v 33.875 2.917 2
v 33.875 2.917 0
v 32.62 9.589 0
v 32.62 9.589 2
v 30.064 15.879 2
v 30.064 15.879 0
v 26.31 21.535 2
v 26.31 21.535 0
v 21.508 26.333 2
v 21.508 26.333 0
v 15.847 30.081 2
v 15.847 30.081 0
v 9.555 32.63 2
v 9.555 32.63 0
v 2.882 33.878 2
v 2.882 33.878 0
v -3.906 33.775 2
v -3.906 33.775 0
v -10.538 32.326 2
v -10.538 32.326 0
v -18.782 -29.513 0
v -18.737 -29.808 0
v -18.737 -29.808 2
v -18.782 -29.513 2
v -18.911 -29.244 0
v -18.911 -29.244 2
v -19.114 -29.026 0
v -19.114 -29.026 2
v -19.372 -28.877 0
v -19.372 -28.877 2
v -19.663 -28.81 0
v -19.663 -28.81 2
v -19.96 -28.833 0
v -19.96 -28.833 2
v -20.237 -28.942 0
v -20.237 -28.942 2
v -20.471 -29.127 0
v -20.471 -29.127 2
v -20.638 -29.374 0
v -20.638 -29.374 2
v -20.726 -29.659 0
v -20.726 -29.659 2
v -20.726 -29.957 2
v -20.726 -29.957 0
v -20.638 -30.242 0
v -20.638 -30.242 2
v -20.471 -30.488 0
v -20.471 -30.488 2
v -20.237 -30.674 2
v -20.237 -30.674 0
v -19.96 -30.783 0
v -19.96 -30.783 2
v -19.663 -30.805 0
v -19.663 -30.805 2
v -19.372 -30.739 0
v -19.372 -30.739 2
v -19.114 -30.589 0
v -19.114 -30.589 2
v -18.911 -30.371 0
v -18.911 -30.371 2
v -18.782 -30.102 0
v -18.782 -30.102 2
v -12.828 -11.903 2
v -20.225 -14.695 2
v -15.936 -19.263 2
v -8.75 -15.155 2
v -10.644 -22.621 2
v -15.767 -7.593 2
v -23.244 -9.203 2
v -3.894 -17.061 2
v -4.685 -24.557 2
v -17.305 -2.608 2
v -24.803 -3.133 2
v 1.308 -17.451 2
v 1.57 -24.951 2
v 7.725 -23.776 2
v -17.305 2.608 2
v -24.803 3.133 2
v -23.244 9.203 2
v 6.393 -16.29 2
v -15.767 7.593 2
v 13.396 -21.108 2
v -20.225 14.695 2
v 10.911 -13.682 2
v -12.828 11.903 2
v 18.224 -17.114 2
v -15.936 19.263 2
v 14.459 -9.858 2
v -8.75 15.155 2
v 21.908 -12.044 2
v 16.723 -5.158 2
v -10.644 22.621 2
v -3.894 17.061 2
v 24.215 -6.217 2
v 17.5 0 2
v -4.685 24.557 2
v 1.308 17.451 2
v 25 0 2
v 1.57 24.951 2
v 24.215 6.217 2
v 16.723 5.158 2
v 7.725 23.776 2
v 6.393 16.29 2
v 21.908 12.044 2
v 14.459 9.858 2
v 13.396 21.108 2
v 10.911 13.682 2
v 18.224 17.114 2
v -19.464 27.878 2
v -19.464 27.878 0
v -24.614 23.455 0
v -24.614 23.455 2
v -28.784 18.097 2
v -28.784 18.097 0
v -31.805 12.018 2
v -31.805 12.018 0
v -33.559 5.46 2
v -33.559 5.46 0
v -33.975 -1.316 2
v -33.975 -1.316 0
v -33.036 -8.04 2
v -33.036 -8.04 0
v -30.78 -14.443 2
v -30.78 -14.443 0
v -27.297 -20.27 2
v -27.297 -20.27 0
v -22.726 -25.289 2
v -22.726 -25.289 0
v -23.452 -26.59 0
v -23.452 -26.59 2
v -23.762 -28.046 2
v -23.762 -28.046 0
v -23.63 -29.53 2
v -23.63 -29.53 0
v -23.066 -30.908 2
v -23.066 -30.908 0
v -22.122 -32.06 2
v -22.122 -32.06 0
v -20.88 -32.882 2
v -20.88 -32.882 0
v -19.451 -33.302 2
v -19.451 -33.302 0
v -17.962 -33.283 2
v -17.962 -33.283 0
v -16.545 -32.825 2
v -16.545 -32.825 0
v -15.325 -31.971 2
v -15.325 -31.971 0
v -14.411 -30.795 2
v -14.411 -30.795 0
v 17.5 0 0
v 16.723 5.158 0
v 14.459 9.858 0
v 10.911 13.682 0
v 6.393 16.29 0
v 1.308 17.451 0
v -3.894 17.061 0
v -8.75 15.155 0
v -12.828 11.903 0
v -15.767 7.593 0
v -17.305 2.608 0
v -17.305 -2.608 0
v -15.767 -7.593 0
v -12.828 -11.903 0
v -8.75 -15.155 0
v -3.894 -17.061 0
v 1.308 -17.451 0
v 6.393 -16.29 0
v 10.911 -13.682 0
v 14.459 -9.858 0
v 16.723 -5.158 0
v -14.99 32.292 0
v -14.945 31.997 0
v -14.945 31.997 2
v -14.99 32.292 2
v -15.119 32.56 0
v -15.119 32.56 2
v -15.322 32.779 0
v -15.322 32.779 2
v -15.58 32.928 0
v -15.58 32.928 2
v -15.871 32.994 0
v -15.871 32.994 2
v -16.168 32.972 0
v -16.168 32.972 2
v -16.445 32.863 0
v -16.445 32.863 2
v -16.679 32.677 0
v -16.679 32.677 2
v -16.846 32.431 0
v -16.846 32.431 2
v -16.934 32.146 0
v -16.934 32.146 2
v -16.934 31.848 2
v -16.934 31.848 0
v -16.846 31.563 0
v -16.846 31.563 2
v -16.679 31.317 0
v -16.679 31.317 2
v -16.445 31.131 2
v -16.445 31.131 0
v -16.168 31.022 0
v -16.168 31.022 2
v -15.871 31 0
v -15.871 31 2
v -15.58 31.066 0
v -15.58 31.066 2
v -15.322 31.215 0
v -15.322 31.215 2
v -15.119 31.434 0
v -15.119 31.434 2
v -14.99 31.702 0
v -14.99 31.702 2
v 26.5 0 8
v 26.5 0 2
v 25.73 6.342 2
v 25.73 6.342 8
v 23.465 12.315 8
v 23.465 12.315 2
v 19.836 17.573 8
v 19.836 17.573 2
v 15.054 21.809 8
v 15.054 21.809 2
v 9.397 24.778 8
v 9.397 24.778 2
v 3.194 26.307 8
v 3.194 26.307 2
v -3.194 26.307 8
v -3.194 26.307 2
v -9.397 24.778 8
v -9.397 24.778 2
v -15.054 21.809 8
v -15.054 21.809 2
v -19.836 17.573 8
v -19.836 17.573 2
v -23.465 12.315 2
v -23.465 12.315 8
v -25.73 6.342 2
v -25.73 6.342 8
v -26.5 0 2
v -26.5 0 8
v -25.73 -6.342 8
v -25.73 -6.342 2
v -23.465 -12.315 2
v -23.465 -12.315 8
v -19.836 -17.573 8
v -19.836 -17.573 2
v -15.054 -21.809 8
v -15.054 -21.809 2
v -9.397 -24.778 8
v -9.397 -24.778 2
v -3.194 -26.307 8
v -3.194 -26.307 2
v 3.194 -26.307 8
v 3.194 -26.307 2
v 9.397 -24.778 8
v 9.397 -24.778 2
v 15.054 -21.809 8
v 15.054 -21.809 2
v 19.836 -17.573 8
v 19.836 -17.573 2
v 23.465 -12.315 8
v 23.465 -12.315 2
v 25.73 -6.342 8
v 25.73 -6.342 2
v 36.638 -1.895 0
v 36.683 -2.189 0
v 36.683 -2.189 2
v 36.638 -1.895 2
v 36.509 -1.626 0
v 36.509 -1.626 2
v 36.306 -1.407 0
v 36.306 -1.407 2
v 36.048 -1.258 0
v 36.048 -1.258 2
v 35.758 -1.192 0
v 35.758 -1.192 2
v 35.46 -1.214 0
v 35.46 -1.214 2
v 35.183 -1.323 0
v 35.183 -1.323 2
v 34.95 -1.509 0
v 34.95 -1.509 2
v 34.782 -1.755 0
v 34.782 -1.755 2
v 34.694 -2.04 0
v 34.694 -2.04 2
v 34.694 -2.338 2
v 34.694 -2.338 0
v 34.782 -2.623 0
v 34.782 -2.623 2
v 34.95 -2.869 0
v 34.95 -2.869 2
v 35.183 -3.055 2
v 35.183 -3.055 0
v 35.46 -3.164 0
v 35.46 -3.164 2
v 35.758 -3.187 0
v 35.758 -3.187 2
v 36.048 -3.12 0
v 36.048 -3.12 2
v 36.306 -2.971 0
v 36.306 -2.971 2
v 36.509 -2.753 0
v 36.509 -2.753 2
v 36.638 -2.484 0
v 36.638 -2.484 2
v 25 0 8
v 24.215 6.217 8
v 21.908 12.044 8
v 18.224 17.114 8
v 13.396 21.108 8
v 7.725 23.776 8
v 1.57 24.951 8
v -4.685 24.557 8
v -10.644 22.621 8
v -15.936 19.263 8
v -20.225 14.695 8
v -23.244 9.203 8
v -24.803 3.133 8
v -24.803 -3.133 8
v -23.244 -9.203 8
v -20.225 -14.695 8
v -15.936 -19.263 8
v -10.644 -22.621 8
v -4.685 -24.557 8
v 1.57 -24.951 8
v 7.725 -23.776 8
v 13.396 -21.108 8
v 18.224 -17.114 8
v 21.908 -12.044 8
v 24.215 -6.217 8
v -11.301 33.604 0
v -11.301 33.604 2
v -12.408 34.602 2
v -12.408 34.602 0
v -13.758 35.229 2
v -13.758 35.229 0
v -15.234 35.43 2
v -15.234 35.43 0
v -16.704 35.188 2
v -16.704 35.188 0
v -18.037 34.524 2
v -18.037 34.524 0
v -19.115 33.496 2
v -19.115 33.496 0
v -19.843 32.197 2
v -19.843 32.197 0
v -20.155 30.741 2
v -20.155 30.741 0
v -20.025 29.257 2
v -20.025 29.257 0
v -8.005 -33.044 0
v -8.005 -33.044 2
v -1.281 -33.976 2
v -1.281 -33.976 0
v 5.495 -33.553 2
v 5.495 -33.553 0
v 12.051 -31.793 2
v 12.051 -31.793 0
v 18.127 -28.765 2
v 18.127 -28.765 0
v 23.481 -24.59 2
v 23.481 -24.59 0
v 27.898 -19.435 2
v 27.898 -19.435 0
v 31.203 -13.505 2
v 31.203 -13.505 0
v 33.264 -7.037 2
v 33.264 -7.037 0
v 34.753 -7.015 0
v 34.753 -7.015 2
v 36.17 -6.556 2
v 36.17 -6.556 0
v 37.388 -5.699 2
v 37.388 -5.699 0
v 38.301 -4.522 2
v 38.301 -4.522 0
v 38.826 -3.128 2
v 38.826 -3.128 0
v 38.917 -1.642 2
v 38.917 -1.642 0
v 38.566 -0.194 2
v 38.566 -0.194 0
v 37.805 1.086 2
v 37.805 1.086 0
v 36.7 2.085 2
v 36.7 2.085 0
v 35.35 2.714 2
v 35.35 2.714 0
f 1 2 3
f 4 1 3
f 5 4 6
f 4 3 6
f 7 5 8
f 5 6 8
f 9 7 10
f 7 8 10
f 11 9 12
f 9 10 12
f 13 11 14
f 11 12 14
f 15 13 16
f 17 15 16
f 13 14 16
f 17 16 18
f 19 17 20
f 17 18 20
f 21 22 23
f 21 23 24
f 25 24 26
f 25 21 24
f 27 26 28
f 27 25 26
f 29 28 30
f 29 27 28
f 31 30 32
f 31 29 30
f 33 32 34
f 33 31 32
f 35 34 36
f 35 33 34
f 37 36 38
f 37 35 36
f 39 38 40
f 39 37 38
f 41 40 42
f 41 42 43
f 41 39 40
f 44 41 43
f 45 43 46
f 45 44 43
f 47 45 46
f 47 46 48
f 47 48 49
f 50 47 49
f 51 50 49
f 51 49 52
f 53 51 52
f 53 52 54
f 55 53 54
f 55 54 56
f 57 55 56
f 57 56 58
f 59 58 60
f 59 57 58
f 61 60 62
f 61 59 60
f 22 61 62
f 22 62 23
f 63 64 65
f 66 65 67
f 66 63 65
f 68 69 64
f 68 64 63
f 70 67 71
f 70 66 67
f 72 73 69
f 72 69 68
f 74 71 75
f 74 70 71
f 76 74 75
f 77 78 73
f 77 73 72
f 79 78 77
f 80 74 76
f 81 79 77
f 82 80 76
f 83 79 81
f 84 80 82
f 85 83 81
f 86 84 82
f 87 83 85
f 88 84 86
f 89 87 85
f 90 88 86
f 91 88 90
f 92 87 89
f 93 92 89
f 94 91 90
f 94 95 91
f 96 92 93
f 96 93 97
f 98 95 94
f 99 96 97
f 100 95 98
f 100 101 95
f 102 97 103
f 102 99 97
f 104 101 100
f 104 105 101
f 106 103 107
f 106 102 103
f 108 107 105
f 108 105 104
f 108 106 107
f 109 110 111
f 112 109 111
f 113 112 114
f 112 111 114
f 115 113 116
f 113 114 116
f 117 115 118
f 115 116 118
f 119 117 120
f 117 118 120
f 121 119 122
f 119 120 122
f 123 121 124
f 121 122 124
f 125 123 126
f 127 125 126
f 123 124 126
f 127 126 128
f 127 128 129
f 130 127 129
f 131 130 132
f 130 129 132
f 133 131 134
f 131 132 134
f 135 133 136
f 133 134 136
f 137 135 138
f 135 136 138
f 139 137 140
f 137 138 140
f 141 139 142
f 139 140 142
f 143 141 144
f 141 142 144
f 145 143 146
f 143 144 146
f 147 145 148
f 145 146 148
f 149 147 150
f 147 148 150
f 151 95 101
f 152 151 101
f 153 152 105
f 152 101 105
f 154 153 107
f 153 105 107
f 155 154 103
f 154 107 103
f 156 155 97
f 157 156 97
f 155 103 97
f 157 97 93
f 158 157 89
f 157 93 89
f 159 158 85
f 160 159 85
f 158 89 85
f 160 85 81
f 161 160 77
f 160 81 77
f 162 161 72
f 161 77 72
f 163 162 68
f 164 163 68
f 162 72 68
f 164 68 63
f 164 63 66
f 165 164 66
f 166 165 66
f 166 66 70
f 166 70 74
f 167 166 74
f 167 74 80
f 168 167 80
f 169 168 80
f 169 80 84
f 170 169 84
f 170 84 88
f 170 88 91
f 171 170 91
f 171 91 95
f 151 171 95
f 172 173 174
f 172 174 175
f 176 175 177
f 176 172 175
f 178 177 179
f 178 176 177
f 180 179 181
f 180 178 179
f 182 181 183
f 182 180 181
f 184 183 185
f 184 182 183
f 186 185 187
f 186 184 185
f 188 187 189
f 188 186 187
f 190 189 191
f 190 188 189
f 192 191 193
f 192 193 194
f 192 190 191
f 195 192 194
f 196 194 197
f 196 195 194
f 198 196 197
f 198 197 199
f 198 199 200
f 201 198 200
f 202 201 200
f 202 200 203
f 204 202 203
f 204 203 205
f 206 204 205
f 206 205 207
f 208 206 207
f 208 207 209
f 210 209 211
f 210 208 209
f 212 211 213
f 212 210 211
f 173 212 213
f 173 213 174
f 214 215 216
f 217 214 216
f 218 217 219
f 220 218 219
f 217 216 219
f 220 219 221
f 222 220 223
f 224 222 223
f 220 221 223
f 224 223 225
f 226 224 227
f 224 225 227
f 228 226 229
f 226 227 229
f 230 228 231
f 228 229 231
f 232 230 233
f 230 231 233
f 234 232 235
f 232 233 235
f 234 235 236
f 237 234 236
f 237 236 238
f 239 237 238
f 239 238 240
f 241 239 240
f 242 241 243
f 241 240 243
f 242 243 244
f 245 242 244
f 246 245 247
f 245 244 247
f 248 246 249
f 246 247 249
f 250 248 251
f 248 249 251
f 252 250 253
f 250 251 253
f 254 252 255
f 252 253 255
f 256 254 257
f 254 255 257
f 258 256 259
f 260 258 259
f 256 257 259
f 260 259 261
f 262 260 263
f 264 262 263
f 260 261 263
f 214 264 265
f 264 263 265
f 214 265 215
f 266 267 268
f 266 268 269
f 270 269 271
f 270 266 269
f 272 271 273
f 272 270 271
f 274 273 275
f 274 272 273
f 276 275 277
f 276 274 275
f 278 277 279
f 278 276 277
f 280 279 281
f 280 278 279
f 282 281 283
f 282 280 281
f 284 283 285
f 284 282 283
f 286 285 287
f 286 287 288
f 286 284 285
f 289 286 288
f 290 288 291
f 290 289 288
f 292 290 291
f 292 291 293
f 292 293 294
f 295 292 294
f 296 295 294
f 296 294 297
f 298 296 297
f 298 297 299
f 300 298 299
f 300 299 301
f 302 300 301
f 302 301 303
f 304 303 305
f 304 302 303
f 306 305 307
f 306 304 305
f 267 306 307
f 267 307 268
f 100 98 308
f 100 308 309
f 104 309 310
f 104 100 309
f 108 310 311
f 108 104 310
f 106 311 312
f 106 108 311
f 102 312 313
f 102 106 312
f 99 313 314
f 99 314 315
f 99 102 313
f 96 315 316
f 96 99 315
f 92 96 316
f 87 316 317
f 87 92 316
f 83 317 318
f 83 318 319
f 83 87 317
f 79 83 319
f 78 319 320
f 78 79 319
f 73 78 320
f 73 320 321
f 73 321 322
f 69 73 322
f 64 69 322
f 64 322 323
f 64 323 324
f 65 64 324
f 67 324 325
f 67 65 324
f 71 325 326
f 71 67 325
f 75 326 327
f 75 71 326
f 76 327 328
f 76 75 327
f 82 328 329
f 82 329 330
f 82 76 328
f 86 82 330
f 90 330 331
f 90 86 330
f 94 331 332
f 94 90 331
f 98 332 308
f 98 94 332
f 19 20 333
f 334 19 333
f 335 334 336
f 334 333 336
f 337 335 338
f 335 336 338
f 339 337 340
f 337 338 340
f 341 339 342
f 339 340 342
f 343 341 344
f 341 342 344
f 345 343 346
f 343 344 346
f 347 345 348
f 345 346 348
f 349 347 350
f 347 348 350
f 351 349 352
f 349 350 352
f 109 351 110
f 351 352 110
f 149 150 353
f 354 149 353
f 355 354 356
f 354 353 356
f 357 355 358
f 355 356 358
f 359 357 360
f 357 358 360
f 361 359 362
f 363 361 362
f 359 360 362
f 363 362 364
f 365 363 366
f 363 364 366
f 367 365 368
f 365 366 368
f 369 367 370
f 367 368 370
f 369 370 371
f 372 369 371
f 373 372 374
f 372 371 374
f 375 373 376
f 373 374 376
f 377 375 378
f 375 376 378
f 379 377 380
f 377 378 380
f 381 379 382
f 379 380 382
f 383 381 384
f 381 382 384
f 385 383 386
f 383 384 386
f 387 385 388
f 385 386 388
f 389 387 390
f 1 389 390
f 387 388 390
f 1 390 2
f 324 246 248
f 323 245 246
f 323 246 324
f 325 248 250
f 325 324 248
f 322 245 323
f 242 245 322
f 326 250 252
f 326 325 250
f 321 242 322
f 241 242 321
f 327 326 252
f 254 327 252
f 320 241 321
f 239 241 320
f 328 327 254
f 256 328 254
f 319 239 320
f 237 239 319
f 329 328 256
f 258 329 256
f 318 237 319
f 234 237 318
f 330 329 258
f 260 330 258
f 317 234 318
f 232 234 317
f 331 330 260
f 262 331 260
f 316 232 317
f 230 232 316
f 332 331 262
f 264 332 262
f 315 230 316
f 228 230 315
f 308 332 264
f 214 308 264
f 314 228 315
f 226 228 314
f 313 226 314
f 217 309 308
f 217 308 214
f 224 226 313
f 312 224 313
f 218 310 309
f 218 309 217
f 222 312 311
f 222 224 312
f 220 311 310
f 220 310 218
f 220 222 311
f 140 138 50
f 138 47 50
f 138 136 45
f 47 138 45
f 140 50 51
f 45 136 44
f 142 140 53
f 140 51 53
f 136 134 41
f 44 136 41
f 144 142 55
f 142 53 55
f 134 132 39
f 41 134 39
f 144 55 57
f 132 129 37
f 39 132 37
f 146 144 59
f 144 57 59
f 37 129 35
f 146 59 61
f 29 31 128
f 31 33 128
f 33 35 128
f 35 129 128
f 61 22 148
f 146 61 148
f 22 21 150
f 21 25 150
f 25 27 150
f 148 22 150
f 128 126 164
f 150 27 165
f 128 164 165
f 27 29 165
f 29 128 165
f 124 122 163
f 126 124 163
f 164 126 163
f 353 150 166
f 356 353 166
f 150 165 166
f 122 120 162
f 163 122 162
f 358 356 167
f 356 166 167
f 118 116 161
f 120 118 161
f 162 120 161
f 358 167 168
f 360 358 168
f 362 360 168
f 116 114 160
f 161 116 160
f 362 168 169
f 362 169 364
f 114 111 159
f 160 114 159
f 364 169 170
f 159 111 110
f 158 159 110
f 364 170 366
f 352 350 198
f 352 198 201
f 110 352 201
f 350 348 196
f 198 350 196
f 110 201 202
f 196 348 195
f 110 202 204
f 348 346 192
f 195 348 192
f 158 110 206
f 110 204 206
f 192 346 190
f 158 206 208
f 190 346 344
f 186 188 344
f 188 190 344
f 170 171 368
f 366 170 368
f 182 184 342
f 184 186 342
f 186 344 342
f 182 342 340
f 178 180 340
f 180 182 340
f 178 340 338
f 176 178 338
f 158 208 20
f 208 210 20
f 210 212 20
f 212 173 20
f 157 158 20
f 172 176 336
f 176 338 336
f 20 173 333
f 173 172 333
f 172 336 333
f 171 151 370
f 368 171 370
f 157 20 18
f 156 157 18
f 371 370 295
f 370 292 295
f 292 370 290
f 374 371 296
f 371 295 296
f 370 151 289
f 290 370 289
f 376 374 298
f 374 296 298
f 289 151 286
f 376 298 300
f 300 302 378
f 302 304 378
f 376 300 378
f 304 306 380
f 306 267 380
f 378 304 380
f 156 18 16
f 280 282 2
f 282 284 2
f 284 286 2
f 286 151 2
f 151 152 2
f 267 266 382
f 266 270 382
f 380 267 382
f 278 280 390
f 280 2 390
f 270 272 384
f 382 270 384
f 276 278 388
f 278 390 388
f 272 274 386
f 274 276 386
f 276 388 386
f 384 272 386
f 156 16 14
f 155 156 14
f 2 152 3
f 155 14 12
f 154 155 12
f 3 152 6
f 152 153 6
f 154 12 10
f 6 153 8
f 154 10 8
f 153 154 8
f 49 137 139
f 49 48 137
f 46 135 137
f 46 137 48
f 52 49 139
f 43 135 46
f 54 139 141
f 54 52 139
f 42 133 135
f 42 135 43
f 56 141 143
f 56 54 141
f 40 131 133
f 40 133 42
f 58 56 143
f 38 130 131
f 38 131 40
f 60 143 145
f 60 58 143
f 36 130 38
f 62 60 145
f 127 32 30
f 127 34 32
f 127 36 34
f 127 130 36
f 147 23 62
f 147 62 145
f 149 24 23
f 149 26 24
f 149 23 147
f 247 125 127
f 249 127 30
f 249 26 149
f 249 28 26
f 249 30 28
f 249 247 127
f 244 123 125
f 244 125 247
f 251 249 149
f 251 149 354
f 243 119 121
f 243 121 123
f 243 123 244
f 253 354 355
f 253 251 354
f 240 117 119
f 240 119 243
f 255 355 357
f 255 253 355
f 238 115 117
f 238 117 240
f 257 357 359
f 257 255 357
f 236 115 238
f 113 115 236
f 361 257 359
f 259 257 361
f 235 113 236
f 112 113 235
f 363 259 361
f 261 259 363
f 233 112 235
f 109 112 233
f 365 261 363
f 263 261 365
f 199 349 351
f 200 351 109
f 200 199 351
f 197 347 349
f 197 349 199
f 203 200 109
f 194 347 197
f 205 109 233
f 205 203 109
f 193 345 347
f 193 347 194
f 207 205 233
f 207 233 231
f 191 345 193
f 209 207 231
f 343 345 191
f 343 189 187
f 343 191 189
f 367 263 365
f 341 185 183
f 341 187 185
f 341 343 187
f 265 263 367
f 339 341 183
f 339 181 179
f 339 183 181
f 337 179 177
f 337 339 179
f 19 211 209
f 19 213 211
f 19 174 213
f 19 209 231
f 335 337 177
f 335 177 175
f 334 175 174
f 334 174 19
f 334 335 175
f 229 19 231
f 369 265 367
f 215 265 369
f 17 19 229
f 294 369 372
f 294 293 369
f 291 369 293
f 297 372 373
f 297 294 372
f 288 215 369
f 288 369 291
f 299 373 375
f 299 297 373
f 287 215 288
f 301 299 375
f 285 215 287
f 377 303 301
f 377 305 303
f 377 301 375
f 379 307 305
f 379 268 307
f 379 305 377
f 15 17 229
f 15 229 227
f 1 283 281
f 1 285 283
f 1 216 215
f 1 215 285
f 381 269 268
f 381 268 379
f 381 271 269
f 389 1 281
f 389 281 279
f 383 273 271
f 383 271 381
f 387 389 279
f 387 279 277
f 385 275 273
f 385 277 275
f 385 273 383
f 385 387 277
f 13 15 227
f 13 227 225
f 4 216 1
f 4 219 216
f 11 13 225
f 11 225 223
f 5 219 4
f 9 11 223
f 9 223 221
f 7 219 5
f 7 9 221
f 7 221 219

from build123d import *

# Parameters (mm, degrees)
SKETCH1_R           = 1
BOSS_EXTRUDE1_DEPTH = 2
SKETCH2_R           = 26.5
SKETCH2_R_2         = 25
BOSS_EXTRUDE2_DEPTH = 6
SKETCH3_R           = 17.5
CUT_EXTRUDE1_DEPTH  = 6


with BuildPart() as part:
    # Sketch1 → Boss-Extrude1 (new body)
    with BuildSketch(Plane.XY):
        with BuildLine():
            ThreePointArc((-19.463908256, 27.877522763), (-33.936185412, 2.082143047), (-22.725920861, -25.288980229))
            ThreePointArc((-22.725920861, -25.288980229), (-21.53176405, -32.517428202), (-14.410688779, -30.795000388))
            ThreePointArc((-14.410688779, -30.795000388), (15.164903933, -30.430670198), (33.263859745, -7.036734675))
            ThreePointArc((33.263859745, -7.036734675), (38.926800914, -2.388340554), (33.874597035, 2.917477625))
            ThreePointArc((33.874597035, 2.917477625), (18.771281479, 28.348527151), (-10.537938884, 32.325714904))
            ThreePointArc((-10.537938884, 32.325714904), (-17.395036864, 34.905768757), (-19.463908256, 27.877522763))
        make_face()
        with Locations((35.682900838, -2.189312175)):
            Circle(SKETCH1_R, mode=Mode.SUBTRACT)
        with Locations((-19.737450379, -29.807642519)):
            Circle(SKETCH1_R, mode=Mode.SUBTRACT)
        with Locations((-15.945450459, 31.996954694)):
            Circle(SKETCH1_R, mode=Mode.SUBTRACT)
    extrude(amount=BOSS_EXTRUDE1_DEPTH)

    # Sketch2 → Boss-Extrude2 (add)
    with BuildSketch(Plane.XY.offset(2)):
        Circle(SKETCH2_R)
        Circle(SKETCH2_R_2, mode=Mode.SUBTRACT)
    extrude(amount=BOSS_EXTRUDE2_DEPTH)

    # Sketch3 → Cut-Extrude1 (cut)
    with BuildSketch(Plane.XY.offset(2)):
        Circle(SKETCH3_R)
    extrude(amount=-CUT_EXTRUDE1_DEPTH, mode=Mode.SUBTRACT)


solid = part.part
